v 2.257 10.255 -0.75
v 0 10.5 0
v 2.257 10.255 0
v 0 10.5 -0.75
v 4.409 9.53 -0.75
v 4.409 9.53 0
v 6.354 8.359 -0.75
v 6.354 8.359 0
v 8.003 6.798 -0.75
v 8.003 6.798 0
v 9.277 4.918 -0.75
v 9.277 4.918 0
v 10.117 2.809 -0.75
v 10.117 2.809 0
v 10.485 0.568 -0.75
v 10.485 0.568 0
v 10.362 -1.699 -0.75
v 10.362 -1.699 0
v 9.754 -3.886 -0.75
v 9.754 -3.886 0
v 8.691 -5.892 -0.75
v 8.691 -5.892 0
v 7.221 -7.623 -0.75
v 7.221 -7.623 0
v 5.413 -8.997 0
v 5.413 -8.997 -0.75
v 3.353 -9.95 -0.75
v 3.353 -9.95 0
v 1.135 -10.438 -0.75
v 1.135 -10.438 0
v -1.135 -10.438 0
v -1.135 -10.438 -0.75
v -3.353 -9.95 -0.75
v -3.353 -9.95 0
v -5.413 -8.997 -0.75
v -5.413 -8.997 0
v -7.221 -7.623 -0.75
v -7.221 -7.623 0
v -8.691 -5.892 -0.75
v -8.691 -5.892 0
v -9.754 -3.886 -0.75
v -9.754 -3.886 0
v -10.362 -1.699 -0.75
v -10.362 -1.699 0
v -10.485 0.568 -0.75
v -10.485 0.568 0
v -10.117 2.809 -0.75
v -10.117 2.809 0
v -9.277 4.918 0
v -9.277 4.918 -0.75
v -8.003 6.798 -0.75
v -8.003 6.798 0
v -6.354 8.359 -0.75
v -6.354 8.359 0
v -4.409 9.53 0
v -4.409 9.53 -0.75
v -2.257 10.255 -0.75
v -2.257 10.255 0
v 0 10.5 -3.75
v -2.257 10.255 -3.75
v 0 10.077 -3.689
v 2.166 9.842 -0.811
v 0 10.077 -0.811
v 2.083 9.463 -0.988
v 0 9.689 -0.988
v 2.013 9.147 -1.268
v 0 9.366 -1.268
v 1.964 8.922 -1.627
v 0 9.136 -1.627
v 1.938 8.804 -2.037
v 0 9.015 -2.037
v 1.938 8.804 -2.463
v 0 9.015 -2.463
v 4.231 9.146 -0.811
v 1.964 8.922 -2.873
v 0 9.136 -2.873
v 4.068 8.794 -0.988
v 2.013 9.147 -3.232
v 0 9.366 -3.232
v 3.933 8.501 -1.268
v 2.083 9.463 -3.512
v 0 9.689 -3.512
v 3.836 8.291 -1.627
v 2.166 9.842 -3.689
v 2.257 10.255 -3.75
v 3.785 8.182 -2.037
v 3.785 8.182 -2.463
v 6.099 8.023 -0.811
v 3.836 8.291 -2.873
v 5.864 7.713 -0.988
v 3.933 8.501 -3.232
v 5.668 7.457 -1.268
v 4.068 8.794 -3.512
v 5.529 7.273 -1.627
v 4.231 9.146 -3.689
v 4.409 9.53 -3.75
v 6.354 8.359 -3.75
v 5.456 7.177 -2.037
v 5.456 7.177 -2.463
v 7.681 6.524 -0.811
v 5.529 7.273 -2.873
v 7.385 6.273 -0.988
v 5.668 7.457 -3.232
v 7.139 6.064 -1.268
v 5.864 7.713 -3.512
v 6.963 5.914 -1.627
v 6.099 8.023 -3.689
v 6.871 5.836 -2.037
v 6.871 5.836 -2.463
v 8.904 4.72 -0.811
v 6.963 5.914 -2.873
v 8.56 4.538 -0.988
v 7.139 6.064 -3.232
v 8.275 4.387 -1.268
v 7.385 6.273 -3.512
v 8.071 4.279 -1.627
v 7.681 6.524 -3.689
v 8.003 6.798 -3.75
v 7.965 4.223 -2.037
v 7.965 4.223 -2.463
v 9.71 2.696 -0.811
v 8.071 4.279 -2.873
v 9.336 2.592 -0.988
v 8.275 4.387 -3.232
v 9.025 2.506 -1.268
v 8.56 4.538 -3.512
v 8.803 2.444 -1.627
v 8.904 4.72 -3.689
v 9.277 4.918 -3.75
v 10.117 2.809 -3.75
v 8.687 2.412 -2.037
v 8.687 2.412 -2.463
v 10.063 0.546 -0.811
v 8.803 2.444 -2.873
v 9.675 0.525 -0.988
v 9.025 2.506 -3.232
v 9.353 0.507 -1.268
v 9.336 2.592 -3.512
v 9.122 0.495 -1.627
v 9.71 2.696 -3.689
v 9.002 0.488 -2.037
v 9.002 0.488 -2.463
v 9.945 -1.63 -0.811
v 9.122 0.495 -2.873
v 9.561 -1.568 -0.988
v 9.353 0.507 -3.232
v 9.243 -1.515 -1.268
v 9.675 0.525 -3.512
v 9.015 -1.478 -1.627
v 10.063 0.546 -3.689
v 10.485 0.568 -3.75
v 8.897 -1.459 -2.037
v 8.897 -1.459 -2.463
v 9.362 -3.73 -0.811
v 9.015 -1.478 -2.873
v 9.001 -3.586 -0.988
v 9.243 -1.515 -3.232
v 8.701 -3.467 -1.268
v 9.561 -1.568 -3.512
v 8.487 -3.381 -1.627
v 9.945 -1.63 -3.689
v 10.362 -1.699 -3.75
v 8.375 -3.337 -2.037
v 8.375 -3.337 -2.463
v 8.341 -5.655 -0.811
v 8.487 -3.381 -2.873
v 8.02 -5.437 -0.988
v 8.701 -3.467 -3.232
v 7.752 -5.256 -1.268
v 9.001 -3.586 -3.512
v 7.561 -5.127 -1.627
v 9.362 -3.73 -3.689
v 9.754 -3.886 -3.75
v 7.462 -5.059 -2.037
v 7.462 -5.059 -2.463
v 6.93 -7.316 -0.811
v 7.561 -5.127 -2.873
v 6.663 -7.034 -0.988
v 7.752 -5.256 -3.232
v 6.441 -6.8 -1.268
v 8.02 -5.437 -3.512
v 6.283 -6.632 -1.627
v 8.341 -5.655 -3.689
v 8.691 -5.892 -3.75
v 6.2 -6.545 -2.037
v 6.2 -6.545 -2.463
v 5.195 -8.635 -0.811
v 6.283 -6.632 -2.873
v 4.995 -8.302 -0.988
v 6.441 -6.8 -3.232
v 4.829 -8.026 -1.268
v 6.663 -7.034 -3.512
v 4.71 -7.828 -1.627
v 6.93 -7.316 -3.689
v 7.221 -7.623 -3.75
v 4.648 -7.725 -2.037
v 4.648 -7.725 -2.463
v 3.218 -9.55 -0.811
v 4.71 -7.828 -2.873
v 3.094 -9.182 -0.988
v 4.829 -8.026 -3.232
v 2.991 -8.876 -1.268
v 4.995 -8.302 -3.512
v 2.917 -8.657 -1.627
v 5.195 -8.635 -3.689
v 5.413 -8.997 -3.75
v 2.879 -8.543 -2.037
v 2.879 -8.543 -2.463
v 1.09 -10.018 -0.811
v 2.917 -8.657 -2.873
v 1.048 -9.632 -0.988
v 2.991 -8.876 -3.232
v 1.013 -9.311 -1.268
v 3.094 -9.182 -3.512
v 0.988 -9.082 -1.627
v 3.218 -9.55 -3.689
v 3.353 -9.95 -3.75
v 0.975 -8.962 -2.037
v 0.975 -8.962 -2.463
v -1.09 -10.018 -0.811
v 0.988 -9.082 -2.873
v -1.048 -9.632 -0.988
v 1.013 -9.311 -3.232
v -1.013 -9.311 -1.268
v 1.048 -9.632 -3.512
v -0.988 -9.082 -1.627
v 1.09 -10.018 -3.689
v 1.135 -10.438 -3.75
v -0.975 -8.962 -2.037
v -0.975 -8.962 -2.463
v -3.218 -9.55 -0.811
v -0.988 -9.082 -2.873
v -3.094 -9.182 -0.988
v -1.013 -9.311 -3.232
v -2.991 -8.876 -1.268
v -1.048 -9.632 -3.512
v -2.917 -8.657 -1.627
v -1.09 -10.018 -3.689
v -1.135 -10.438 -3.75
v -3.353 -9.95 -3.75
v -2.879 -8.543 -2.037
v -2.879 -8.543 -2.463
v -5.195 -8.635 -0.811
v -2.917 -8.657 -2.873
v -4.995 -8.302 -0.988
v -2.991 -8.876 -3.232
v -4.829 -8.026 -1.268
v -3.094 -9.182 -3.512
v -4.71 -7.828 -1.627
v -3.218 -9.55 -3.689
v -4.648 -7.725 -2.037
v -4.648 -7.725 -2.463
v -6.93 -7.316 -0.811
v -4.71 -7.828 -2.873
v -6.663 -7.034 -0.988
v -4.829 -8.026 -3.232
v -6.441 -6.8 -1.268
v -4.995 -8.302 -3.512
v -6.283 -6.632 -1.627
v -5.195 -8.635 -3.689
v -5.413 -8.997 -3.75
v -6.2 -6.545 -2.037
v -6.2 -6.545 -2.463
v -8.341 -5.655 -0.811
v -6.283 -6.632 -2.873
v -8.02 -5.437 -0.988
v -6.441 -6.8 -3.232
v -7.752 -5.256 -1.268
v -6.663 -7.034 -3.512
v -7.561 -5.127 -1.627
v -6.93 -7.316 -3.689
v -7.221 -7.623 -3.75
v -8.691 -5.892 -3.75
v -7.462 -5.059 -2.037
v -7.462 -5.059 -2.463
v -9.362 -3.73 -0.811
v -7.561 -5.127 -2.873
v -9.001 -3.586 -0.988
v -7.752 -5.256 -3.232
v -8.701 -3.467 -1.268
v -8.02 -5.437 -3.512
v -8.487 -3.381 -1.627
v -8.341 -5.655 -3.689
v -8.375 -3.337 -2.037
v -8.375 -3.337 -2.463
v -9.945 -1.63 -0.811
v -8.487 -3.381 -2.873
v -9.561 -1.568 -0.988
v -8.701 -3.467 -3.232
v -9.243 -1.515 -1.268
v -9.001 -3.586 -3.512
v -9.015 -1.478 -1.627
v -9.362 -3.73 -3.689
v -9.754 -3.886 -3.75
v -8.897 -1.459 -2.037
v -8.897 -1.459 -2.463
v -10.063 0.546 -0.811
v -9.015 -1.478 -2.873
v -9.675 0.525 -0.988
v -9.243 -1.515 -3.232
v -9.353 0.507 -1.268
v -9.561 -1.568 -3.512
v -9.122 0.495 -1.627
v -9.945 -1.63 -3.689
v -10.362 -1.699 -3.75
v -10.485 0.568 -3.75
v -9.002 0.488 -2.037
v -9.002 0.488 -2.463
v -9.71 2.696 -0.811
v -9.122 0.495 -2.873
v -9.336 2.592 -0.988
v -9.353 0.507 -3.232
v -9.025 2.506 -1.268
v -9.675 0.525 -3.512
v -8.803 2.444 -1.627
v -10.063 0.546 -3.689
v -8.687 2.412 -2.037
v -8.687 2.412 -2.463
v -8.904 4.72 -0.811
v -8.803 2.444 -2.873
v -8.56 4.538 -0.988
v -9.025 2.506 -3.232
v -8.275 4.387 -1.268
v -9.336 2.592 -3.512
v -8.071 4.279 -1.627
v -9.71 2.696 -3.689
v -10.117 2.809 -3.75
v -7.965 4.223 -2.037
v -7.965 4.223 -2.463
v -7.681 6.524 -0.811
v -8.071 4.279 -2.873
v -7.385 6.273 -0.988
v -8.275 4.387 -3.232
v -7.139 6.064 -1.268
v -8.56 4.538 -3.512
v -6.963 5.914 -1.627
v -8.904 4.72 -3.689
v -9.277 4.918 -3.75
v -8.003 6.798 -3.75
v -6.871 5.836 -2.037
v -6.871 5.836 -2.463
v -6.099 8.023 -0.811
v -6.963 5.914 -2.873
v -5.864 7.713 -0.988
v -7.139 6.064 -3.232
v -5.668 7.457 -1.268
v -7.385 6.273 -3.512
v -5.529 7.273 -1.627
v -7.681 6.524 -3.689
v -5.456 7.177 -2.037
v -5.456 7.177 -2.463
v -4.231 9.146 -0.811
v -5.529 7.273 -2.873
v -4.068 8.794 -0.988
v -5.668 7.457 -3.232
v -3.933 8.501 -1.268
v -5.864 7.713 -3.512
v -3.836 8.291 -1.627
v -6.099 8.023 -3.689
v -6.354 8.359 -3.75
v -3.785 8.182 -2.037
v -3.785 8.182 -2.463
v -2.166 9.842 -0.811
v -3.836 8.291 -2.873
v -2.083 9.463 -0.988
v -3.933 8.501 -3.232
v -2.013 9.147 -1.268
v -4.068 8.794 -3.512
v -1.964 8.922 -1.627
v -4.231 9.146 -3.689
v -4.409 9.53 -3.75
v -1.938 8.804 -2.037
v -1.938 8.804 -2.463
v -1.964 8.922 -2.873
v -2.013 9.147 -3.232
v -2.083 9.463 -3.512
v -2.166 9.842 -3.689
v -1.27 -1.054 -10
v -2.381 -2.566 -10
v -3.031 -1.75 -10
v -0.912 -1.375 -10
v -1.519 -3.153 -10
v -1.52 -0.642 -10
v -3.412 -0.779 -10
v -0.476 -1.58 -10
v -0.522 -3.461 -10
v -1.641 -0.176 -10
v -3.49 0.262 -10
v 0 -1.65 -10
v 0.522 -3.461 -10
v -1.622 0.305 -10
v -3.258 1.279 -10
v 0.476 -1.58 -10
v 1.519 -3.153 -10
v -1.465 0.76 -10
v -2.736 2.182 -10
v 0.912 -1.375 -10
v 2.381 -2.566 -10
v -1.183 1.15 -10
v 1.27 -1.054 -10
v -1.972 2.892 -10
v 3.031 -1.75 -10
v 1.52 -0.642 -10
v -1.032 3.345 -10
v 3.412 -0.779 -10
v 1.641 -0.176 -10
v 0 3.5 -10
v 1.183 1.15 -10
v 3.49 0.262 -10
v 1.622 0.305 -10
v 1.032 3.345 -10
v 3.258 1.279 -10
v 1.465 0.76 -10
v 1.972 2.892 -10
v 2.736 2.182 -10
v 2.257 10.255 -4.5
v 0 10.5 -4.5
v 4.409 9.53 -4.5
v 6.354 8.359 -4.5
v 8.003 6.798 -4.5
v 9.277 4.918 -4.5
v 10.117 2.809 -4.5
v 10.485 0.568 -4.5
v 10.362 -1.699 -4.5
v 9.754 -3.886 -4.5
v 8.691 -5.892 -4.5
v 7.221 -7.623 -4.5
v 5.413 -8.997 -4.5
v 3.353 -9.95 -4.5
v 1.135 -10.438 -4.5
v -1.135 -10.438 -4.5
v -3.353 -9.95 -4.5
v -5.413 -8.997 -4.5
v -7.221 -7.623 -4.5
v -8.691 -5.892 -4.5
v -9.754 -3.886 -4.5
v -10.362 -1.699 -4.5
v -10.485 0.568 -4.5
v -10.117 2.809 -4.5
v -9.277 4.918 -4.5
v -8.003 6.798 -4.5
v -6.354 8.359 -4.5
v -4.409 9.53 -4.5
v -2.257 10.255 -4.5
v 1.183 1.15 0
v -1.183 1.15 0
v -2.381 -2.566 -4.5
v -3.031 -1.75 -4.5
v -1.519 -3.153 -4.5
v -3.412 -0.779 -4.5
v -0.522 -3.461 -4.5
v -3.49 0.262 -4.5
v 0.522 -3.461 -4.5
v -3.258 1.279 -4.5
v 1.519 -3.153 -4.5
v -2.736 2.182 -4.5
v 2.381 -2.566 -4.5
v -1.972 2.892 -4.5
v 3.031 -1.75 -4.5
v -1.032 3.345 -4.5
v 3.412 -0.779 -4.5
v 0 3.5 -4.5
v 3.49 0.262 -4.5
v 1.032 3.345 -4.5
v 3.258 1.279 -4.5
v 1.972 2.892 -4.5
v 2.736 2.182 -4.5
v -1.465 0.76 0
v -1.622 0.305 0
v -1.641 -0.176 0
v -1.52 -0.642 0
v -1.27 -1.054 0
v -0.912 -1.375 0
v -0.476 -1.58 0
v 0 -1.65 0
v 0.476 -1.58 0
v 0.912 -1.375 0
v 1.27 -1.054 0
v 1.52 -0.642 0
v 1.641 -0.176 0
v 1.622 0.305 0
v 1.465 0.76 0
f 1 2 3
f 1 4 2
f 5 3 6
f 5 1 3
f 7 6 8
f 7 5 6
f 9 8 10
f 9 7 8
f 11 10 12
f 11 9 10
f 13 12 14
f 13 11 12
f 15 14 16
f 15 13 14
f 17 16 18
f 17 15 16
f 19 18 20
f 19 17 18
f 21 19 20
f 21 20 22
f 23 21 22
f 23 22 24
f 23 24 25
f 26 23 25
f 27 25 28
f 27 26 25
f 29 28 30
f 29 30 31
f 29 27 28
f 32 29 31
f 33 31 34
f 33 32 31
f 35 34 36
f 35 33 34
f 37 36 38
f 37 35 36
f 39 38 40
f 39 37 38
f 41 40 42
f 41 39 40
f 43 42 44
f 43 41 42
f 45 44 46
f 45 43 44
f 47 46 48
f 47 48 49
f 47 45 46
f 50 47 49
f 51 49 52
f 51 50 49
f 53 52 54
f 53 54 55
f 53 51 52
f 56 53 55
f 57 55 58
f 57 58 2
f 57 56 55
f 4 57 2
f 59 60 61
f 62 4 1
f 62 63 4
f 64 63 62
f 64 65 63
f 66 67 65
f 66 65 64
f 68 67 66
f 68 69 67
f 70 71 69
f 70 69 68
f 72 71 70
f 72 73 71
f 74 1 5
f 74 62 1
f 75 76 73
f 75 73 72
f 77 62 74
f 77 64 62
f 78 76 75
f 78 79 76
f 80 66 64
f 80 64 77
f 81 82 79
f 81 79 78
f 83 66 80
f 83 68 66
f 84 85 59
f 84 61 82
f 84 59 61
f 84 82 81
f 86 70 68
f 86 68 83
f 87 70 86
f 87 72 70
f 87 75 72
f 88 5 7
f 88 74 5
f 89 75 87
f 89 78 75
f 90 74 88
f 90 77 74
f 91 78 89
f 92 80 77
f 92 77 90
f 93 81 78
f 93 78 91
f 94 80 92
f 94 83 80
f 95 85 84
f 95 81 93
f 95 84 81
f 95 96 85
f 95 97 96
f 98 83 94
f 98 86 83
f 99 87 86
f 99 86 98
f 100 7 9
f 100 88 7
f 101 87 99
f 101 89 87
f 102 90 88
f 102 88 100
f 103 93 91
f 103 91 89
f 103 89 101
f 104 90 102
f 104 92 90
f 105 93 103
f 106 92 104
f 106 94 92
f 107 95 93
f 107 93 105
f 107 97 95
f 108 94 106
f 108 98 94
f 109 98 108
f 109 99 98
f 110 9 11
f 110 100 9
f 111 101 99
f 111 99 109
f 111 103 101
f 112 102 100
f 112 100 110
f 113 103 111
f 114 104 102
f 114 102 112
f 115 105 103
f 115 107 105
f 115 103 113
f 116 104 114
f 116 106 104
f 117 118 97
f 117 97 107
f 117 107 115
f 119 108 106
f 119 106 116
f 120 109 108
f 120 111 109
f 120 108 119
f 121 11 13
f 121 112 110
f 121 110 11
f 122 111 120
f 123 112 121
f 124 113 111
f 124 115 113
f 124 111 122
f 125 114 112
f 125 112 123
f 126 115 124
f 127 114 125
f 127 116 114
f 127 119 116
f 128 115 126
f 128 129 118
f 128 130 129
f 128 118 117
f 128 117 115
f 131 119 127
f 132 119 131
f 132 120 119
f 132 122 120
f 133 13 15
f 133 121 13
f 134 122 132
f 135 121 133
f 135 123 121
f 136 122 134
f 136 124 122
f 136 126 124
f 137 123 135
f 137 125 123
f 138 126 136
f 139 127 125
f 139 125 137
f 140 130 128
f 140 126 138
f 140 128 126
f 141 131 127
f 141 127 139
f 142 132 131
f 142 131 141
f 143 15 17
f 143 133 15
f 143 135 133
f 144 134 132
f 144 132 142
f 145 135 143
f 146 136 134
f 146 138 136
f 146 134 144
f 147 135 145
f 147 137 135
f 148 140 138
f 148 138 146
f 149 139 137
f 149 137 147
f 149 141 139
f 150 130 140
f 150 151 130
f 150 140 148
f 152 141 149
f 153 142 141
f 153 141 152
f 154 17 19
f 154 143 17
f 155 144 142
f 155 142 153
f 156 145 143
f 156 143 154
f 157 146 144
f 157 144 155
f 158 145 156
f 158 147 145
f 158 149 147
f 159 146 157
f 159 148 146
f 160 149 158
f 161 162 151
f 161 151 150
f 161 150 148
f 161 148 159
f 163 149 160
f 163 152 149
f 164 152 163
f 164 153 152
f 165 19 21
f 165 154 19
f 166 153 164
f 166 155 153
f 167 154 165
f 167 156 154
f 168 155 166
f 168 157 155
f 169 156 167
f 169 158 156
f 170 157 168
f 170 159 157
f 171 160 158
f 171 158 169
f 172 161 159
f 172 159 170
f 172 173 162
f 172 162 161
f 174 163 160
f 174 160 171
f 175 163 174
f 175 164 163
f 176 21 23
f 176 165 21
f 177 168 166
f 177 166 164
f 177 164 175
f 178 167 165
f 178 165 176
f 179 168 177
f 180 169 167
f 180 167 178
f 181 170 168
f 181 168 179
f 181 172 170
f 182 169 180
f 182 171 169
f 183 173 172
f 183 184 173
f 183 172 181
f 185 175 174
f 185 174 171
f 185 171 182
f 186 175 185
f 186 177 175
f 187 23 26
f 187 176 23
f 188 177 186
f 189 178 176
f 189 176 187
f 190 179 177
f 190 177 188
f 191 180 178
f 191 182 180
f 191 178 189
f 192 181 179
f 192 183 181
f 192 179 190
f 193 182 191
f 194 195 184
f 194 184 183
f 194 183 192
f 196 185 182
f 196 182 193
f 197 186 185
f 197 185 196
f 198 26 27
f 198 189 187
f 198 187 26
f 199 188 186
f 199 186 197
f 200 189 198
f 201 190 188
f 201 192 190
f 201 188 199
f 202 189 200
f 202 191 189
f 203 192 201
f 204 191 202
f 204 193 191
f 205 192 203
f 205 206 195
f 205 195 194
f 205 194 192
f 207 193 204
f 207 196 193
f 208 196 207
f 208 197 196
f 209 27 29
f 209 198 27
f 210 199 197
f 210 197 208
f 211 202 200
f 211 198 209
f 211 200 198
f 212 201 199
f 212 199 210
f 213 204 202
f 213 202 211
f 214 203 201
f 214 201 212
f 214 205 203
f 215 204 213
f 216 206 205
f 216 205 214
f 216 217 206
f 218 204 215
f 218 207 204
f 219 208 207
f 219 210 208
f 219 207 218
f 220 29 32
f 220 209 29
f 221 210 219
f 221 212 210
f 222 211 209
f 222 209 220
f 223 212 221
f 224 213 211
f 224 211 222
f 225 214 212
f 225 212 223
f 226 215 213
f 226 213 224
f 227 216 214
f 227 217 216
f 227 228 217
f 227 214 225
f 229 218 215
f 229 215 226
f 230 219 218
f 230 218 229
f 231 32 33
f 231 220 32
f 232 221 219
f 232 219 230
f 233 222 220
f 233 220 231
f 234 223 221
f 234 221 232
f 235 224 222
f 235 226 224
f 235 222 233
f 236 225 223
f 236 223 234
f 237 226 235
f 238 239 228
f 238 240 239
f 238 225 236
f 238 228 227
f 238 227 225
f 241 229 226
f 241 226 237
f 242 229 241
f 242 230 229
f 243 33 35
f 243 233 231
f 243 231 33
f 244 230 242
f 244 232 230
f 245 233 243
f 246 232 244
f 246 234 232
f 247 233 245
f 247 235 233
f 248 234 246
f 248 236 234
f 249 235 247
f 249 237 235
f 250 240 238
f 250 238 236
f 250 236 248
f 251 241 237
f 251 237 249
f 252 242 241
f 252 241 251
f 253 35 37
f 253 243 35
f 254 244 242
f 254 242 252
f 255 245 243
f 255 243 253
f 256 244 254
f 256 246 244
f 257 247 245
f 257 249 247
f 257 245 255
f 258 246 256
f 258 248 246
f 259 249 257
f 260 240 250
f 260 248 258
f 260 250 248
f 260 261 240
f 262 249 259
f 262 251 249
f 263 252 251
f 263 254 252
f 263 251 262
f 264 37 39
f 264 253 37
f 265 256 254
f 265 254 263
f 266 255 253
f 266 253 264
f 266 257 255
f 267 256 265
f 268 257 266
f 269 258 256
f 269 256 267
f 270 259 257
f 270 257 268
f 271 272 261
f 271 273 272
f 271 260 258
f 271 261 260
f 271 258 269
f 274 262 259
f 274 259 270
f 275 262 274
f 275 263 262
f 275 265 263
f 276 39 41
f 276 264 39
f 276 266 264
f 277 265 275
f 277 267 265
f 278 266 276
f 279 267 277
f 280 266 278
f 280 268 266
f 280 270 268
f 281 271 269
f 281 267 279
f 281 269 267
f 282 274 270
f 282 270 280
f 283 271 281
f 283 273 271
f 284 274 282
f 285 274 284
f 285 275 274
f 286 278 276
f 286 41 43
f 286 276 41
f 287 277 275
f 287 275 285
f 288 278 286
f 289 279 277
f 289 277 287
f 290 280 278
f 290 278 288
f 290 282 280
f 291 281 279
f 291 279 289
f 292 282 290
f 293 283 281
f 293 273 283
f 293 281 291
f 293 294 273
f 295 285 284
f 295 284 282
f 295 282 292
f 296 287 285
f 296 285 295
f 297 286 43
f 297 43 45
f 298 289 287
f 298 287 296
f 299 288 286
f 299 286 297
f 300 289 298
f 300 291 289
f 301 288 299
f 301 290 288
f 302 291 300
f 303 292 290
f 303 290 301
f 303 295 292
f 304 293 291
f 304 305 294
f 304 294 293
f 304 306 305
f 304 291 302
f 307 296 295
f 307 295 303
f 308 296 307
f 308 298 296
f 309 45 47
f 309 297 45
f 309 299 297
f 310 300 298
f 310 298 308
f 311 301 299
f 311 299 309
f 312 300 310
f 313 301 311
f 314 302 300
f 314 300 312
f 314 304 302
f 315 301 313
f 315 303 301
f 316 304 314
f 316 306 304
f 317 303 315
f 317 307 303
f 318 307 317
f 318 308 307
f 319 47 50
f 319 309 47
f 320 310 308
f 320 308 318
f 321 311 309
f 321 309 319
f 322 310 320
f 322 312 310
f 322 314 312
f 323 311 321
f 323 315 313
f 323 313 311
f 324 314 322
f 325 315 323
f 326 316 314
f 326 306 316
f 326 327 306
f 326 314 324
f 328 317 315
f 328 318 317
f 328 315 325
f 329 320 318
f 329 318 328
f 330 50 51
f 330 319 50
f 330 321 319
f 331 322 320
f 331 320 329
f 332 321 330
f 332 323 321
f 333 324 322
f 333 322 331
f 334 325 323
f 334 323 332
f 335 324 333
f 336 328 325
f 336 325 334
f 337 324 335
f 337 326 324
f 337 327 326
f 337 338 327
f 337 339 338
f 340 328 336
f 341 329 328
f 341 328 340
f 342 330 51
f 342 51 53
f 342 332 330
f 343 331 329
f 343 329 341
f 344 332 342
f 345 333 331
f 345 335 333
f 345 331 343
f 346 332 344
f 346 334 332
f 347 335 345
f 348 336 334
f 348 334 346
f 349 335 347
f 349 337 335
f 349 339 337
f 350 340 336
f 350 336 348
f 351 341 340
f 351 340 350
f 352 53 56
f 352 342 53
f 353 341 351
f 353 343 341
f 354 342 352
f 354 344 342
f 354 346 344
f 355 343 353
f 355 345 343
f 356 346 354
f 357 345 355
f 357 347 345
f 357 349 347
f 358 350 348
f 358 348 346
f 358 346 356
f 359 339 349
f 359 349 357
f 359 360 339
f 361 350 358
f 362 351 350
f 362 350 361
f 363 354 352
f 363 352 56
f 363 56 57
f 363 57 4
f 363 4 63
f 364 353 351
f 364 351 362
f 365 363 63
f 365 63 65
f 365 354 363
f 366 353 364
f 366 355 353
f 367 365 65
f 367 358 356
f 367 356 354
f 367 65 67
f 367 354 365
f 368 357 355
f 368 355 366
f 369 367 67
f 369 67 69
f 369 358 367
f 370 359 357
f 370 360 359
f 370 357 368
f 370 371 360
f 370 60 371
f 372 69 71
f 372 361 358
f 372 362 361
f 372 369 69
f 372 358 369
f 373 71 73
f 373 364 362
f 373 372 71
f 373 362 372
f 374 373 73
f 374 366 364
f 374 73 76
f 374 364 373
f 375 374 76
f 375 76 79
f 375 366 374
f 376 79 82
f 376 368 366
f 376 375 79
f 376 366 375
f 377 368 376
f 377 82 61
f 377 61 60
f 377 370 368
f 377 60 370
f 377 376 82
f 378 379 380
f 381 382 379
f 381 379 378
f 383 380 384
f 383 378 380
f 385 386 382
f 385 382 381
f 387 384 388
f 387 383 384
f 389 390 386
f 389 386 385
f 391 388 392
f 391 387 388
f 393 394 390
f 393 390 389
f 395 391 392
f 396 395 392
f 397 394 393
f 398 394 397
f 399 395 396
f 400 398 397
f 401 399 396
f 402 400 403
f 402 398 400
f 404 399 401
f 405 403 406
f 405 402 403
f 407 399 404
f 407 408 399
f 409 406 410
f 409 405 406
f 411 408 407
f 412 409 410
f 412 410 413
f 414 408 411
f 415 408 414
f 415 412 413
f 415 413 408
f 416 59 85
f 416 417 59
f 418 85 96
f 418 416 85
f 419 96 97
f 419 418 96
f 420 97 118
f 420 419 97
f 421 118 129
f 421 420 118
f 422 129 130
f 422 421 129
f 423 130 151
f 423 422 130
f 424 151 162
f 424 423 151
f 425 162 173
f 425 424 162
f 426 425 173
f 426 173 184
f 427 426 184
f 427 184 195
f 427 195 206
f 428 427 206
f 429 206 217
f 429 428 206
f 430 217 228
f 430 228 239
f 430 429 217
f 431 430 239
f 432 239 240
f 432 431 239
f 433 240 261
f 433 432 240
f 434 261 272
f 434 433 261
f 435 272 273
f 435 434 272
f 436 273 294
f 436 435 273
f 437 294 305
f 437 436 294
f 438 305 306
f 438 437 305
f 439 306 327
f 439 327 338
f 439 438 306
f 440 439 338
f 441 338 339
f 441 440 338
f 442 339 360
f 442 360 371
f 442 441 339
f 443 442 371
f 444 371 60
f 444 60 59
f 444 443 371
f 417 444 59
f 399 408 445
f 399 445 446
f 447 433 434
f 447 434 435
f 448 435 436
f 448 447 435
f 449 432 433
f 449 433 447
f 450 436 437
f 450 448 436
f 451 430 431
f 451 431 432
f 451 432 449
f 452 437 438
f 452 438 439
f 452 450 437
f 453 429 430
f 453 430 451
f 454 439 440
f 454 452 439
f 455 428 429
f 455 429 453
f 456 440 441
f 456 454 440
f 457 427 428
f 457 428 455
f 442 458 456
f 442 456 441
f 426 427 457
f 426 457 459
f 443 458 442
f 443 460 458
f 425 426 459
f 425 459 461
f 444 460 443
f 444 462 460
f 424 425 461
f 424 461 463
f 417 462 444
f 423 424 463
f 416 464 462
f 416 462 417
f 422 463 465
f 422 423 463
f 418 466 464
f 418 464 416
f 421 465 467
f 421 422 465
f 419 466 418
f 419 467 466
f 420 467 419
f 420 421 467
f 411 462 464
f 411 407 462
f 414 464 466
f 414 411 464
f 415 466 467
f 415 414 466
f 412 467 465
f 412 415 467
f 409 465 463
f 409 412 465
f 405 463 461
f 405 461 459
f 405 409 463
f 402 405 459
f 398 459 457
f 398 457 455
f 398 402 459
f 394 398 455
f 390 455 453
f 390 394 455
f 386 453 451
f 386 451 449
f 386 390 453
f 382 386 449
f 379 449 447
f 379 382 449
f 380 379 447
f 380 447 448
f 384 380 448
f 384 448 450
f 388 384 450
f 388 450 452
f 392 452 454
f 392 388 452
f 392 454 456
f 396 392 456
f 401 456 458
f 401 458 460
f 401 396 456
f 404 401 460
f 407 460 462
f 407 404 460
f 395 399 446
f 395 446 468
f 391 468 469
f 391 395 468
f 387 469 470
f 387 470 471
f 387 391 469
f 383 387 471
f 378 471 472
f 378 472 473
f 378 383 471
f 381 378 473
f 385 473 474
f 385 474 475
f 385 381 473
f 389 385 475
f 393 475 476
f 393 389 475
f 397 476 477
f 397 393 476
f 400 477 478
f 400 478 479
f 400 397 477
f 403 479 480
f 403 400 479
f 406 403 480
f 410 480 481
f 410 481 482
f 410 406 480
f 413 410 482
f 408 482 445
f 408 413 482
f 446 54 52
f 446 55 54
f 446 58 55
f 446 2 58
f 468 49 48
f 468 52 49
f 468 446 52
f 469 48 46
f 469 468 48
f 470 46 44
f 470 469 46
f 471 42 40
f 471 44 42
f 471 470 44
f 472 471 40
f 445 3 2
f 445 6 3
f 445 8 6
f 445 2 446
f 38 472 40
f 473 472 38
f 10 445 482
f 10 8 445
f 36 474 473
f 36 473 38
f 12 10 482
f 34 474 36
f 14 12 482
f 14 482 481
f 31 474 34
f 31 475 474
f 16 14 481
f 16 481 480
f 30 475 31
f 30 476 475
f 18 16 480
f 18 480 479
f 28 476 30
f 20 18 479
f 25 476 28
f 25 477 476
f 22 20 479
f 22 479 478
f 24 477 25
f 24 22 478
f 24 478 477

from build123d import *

# Parameters (mm, degrees)
CORTAR_EXTRUIR1_DEPTH = 11
CORTAR_EXTRUIR2_DEPTH = 10


with BuildPart() as part:
    # Croquis1 → Revolución1 (revolve)
    with BuildSketch(Plane(origin=(0, 0, 0), x_dir=(0, 0, -1), z_dir=(1, 0, 0))):
        with BuildLine():
            Line((0, 0), (0, 10.5))
            Line((0, 10.5), (0.75, 10.5))
            ThreePointArc((0.75, 10.5), (2.25, 9), (3.75, 10.5))
            Line((3.75, 10.5), (4.5, 10.5))
            Line((4.5, 10.5), (4.5, 3.5))
            Line((4.5, 3.5), (10, 3.5))
            Line((10, 3.5), (10, 0))
            Line((10, 0), (0, 0))
        make_face()
    revolve(axis=Axis((0, 0, 0), (0, 0, -1)))

    # Croquis2 → Cortar-Extruir1 (cut, through all)
    with BuildSketch(Plane(origin=(0, 0, -10), x_dir=(-1, 0, 0), z_dir=(0, 0, -1))):
        with BuildLine():
            Line((-1.161895004, 1.1), (1.161895004, 1.1))
            ThreePointArc((1.161895004, 1.1), (0, -1.6), (-1.161895004, 1.1))
        make_face()
    extrude(amount=-CORTAR_EXTRUIR1_DEPTH, mode=Mode.SUBTRACT)

    # Croquis3 → Cortar-Extruir2 (cut)
    with BuildSketch(Plane(origin=(0, 0, -10), x_dir=(-1, 0, 0), z_dir=(0, 0, -1))):
        with BuildLine():
            Line((-1.183215957, 1.15), (1.183215957, 1.15))
            ThreePointArc((1.183215957, 1.15), (0, -1.65), (-1.183215957, 1.15))
        make_face()
    extrude(amount=-CORTAR_EXTRUIR2_DEPTH, mode=Mode.SUBTRACT)


solid = part.part
